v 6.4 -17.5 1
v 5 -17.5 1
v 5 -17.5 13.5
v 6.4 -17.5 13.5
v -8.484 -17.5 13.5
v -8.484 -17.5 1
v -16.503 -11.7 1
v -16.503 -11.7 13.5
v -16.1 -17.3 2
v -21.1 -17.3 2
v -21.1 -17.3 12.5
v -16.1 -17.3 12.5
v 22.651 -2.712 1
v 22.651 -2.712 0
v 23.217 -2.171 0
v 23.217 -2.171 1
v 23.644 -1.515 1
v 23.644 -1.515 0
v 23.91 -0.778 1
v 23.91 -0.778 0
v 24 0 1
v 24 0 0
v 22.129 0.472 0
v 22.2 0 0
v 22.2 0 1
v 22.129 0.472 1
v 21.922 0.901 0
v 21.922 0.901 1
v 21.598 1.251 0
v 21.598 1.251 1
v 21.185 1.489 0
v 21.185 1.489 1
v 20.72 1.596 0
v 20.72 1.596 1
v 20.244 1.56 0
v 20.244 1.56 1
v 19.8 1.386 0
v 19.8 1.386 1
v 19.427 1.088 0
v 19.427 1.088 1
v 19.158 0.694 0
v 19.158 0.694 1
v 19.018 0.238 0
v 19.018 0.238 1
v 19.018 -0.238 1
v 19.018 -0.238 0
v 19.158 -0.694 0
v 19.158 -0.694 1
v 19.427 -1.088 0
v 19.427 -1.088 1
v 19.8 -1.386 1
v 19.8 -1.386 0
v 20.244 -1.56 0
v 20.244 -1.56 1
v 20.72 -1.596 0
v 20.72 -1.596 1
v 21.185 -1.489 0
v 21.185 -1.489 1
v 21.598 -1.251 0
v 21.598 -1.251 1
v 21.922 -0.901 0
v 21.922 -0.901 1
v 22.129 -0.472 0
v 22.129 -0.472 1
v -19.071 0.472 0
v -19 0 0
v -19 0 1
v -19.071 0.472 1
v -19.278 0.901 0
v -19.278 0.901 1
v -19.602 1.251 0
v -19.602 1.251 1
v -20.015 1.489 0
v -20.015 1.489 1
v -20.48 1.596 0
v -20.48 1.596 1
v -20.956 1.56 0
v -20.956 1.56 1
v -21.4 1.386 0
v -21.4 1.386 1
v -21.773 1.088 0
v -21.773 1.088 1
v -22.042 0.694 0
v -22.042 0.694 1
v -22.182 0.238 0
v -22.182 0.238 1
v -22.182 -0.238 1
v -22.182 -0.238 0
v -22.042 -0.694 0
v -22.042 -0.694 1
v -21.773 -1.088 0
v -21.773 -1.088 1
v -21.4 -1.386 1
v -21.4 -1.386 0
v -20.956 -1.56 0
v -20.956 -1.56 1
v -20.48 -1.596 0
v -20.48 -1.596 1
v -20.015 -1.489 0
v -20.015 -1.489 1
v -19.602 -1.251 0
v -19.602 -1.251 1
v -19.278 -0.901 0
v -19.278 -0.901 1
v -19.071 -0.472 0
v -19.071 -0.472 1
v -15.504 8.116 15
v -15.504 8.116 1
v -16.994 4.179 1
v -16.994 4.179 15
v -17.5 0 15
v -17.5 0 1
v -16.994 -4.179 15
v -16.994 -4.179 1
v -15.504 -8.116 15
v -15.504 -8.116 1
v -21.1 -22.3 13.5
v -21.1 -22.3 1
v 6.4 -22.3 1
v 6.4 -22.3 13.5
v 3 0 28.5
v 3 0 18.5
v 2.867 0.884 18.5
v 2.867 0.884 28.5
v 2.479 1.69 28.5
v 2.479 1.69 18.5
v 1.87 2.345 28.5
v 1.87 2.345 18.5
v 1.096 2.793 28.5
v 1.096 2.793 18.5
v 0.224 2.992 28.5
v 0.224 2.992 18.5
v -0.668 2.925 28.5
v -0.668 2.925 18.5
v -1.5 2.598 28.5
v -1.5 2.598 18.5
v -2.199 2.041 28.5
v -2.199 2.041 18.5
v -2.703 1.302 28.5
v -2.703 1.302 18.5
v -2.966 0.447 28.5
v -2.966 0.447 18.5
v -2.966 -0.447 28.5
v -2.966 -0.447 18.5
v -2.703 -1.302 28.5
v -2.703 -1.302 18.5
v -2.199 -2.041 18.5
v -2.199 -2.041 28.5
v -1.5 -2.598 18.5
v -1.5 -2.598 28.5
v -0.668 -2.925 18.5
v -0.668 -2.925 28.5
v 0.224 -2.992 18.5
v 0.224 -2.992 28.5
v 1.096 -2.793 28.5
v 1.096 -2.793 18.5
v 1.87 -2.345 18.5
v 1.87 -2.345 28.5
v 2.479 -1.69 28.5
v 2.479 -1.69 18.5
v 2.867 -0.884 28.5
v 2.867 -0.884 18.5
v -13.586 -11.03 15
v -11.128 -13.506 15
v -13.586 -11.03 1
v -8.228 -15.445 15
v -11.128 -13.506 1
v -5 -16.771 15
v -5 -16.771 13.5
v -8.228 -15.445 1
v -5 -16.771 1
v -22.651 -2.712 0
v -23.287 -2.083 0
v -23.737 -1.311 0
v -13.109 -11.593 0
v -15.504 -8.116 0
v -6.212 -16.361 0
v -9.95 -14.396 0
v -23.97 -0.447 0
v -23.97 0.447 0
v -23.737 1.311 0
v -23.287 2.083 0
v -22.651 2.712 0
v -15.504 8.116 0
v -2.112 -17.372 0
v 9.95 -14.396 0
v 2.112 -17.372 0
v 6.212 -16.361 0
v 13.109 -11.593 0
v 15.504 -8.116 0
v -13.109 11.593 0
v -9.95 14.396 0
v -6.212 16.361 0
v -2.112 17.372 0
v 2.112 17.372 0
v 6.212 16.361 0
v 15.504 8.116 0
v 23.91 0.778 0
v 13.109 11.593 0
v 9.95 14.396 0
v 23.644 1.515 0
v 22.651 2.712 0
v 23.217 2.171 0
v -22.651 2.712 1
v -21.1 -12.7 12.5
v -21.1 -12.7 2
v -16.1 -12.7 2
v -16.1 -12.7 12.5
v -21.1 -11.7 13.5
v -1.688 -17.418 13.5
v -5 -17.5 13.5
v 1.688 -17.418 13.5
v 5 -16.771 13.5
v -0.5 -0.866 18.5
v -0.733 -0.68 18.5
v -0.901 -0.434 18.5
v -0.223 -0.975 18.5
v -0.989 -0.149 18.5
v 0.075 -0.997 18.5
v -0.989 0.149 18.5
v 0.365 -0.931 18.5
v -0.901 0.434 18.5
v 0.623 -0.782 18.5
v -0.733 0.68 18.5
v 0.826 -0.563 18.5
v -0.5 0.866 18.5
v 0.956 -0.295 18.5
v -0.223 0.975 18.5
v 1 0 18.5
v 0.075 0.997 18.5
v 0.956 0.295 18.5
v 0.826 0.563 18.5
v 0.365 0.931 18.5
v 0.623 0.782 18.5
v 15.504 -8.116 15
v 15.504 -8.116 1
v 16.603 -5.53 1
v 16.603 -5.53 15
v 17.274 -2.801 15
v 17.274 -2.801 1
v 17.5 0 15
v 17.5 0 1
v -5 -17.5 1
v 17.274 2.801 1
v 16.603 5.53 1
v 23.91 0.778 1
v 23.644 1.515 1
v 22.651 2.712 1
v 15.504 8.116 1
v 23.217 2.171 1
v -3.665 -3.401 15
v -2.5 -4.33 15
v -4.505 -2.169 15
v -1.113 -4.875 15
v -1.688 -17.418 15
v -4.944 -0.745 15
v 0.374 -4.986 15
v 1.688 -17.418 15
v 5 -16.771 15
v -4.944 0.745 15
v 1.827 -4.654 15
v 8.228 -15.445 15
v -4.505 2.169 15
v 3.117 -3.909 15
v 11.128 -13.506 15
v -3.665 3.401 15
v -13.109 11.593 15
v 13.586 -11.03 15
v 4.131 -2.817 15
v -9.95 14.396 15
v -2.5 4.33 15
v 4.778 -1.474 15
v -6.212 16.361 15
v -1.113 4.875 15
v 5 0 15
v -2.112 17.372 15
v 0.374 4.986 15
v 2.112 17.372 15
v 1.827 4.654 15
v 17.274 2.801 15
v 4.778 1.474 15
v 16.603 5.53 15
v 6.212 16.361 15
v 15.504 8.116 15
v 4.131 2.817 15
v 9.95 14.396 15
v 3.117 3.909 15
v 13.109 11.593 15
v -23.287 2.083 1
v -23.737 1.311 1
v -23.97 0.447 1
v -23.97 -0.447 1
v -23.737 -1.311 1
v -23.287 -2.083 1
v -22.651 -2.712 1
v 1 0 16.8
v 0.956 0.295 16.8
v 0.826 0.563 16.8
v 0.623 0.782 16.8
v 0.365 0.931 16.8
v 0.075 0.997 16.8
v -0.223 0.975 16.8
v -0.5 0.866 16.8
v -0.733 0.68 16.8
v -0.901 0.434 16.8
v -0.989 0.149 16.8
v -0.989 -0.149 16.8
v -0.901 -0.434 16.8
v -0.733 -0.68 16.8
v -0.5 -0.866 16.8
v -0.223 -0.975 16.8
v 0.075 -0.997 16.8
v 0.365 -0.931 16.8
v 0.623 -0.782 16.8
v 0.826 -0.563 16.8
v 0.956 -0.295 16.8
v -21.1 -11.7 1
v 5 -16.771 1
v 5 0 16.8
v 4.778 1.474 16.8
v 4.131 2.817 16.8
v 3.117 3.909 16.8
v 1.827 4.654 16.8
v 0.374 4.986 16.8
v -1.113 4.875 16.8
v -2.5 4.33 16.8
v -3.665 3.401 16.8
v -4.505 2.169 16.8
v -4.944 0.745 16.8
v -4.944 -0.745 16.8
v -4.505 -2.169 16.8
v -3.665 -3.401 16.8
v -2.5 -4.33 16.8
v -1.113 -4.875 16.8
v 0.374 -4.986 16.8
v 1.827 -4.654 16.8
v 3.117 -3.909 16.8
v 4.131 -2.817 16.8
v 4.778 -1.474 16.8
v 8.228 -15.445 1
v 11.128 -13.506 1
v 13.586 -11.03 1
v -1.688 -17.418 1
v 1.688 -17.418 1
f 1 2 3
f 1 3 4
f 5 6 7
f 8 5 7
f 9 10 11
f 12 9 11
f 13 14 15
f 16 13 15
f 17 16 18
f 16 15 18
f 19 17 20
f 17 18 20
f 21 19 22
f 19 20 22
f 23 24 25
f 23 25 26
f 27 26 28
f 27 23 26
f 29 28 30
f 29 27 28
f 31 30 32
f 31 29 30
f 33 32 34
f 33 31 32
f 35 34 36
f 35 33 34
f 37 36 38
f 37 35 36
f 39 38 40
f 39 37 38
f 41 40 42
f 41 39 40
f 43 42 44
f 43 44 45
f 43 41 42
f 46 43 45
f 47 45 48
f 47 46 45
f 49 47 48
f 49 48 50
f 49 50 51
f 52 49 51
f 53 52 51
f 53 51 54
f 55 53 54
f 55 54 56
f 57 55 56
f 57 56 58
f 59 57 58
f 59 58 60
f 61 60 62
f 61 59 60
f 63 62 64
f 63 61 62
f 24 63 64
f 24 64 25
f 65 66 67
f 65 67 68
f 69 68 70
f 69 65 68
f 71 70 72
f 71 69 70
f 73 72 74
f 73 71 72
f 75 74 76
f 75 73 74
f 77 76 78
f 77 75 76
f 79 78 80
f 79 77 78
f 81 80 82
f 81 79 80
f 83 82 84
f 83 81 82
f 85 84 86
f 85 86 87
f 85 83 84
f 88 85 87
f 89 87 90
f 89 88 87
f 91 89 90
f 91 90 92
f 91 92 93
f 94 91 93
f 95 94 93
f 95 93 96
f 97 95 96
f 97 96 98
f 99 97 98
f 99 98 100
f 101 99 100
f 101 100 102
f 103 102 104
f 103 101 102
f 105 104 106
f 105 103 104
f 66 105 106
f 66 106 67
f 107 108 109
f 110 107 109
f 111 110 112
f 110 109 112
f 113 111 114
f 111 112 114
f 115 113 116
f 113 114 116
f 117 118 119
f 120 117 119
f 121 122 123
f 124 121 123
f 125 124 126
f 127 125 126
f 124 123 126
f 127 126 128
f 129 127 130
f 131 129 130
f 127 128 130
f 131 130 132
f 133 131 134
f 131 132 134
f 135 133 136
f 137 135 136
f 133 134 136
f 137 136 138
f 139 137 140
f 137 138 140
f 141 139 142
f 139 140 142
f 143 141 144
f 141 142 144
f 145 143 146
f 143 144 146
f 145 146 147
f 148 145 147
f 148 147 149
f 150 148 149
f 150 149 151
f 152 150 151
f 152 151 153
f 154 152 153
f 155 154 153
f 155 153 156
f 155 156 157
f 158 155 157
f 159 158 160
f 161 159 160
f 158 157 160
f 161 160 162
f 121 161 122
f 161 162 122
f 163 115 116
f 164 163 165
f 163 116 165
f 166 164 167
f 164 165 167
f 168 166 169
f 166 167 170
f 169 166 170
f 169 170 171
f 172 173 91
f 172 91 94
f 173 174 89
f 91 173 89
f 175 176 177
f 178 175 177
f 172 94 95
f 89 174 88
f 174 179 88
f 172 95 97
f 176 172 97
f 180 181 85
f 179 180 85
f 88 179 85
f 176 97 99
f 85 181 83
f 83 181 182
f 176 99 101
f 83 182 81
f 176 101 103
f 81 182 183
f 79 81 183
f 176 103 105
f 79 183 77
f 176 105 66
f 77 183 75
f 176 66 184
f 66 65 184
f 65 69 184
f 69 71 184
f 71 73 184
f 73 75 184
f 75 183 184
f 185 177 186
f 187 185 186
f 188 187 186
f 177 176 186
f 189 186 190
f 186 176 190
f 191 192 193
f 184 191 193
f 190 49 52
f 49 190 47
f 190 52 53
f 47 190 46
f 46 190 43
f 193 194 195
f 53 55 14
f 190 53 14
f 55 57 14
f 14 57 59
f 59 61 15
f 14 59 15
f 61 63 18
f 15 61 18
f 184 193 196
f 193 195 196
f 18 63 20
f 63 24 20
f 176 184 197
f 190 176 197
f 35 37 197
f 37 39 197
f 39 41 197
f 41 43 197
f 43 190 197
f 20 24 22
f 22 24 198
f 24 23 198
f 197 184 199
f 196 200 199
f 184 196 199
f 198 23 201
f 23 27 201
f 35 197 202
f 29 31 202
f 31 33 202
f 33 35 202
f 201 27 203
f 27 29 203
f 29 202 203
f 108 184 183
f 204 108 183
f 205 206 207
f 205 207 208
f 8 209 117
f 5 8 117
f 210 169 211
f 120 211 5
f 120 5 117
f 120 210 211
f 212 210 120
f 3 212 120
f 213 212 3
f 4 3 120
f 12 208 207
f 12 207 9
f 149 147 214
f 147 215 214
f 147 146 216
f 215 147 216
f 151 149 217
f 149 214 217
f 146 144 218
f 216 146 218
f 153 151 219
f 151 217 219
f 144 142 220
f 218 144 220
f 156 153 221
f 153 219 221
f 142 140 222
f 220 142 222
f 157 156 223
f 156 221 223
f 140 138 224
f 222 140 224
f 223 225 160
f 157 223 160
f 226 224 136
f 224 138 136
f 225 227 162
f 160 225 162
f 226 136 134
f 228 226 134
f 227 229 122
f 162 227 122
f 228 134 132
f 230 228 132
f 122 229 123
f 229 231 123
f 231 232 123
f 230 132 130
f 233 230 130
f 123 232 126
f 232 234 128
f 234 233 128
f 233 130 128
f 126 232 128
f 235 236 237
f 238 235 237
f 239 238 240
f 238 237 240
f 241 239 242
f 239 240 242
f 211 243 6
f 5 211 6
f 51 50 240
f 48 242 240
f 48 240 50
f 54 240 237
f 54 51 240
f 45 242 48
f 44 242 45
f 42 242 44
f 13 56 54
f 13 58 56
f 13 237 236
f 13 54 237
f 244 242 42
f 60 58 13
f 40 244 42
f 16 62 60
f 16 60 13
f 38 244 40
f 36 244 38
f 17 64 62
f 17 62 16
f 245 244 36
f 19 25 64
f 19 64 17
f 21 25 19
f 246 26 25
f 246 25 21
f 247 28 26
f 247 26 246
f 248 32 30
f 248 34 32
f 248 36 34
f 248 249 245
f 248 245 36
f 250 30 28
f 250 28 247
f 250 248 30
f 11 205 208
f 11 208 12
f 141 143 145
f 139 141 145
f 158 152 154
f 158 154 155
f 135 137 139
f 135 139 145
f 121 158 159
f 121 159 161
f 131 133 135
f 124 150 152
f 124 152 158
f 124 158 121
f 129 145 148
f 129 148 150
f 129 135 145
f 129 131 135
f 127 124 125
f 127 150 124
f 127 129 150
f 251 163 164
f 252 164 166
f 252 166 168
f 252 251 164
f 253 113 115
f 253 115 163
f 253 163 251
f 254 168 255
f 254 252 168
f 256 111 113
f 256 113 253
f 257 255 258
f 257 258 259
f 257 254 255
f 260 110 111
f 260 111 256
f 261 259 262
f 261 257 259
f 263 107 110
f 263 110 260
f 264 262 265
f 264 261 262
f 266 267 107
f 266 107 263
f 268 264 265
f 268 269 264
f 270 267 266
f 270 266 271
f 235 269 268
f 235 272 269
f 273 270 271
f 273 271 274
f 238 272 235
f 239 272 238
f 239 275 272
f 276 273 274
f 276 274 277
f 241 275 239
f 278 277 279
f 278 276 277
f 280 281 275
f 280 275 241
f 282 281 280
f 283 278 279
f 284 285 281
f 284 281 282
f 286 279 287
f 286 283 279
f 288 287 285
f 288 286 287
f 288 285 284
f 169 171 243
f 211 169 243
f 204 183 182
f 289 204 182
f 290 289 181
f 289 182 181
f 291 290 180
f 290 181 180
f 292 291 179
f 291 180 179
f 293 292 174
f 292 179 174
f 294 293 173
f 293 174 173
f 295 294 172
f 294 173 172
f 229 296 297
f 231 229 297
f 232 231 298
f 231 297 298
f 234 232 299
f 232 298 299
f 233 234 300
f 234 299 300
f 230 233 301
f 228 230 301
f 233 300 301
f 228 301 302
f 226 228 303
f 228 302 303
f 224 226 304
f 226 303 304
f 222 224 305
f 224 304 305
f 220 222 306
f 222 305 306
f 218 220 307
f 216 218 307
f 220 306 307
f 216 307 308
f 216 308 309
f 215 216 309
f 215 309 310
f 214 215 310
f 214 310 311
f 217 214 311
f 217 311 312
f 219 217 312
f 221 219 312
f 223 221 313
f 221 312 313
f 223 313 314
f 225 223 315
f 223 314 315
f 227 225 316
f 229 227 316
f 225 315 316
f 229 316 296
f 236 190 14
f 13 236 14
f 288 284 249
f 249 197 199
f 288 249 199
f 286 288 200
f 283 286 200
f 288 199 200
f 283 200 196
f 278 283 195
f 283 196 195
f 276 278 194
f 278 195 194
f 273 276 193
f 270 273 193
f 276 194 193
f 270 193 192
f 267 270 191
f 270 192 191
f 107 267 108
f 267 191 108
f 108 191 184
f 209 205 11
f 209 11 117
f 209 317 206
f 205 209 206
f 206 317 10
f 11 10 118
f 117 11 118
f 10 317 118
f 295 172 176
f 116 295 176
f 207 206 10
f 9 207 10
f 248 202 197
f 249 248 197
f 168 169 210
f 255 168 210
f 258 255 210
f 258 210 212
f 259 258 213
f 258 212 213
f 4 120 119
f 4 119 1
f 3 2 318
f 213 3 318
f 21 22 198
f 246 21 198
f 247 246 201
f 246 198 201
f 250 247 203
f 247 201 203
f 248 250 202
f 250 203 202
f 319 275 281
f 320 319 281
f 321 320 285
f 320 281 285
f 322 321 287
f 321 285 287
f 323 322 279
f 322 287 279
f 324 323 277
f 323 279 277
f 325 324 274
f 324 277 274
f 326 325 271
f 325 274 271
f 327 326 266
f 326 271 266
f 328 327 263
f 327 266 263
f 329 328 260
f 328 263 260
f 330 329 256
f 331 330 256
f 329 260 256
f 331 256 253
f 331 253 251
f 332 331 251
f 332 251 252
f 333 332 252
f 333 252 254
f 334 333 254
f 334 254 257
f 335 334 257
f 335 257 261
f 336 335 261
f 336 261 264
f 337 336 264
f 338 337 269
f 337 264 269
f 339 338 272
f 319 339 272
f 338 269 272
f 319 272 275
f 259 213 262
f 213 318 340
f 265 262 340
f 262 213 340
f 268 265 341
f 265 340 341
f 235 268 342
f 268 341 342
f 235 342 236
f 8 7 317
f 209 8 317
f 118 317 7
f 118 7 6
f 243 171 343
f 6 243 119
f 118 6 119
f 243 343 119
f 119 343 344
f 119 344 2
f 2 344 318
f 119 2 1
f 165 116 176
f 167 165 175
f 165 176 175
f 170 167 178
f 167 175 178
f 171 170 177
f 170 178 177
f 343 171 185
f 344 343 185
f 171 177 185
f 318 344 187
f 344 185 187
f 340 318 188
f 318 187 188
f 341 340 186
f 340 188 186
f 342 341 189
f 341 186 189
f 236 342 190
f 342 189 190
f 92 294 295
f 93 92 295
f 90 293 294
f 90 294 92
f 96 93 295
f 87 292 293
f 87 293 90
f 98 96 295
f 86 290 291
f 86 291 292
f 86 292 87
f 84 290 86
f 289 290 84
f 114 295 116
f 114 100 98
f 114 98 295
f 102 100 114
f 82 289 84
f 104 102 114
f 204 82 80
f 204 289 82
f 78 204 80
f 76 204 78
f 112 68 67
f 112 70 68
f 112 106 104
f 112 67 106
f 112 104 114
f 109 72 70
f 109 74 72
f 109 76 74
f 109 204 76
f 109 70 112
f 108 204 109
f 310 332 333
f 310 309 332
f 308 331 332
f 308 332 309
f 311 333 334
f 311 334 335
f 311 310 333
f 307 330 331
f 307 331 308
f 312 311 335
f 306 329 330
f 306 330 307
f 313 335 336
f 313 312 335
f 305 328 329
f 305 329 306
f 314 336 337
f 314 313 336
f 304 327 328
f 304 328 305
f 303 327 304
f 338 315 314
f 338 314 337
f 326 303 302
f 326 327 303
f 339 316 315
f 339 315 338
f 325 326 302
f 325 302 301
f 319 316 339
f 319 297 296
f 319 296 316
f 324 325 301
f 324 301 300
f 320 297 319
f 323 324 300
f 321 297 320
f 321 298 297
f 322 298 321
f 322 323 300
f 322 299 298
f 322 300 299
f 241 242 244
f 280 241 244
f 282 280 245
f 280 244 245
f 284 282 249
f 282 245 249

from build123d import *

# Parameters (mm, degrees)
F0_R      = 1.6
F1_DEPTH  = 1
F3_DEPTH  = 14
F2_W      = 1.4
F2_H      = 4.8
F4_DEPTH  = 12.5
F5_R      = 5
F6_DEPTH  = 1.8
F7_R      = 1
F8_DEPTH  = 1.7
F9_R      = 3
F10_DEPTH = 10
F11_W     = 4.6
F11_H     = 10.5
F12_DEPTH = 5


with BuildPart() as f1:
    # F0 (on Top) → F1 (new body)
    with BuildSketch(Plane.XY):
        with BuildLine():
            Line((15.5043796111, -8.1156769819), (15.5043796111, 8.1156769819))
            ThreePointArc((15.5043796111, 8.1156769819), (0, 17.5), (-15.5043796111, 8.1156769819))
            Line((-15.5043796111, 8.1156769819), (-15.5043796111, -8.1156769819))
            ThreePointArc((-15.5043796111, -8.1156769819), (0, -17.5), (15.5043796111, -8.1156769819))
        make_face()
        with BuildLine():
            Line((22.650669435, 2.7119651303), (15.5043796111, 8.1156769819))
            ThreePointArc((15.5043796111, 8.1156769819), (16.8286129371, 4.8008110372), (17.4526699029, 1.2862010962))
            ThreePointArc((17.4526699029, 1.2862010962), (19.700629708, 3.2788920504), (22.650669435, 2.7119651303))
        make_face()
        with BuildLine():
            ThreePointArc((17.4526699029, 1.2862010962), (16.8286129371, 4.8008110372), (15.5043796111, 8.1156769819))
            Line((15.5043796111, 8.1156769819), (15.5043796111, -8.1156769819))
            ThreePointArc((15.5043796111, -8.1156769819), (16.8286129371, -4.8008110372), (17.4526699029, -1.2862010962))
            ThreePointArc((17.4526699029, -1.2862010962), (17.2, 0), (17.4526699029, 1.2862010962))
        make_face()
        with BuildLine():
            Line((-15.5043796111, -8.1156769819), (-15.5043796111, 8.1156769819))
            ThreePointArc((-15.5043796111, 8.1156769819), (-16.8286129371, 4.8008110372), (-17.4526699029, 1.2862010962))
            ThreePointArc((-17.4526699029, 1.2862010962), (-17.2637654212, 0.655392123), (-17.2, 0))
            ThreePointArc((-17.2, 0), (-17.2637654212, -0.655392123), (-17.4526699029, -1.2862010962))
            ThreePointArc((-17.4526699029, -1.2862010962), (-16.8286129371, -4.8008110372), (-15.5043796111, -8.1156769819))
        make_face()
        with BuildLine():
            ThreePointArc((-17.4526699029, 1.2862010962), (-16.8286129371, 4.8008110372), (-15.5043796111, 8.1156769819))
            Line((-15.5043796111, 8.1156769819), (-22.650669435, 2.7119651303))
            ThreePointArc((-22.650669435, 2.7119651303), (-19.700629708, 3.2788920504), (-17.4526699029, 1.2862010962))
        make_face()
        with BuildLine():
            ThreePointArc((22.650669435, 2.7119651303), (19.700629708, 3.2788920504), (17.4526699029, 1.2862010962))
            ThreePointArc((17.4526699029, 1.2862010962), (17.4881634728, 0.6435358184), (17.5, 0))
            ThreePointArc((17.5, 0), (17.4881634728, -0.6435358184), (17.4526699029, -1.2862010962))
            ThreePointArc((17.4526699029, -1.2862010962), (19.700629708, -3.2788920504), (22.650669435, -2.7119651303))
            Line((22.650669435, -2.7119651303), (22.650669435, 2.7119651303))
        make_face()
        with Locations((20.6, 0)):
            Circle(F0_R, mode=Mode.SUBTRACT)
        with BuildLine():
            ThreePointArc((17.4526699029, -1.2862010962), (16.8286129371, -4.8008110372), (15.5043796111, -8.1156769819))
            Line((15.5043796111, -8.1156769819), (22.650669435, -2.7119651303))
            ThreePointArc((22.650669435, -2.7119651303), (19.700629708, -3.2788920504), (17.4526699029, -1.2862010962))
        make_face()
        with BuildLine():
            ThreePointArc((24, 0), (23.6440331863, 1.5145500851), (22.650669435, 2.7119651303))
            Line((22.650669435, 2.7119651303), (22.650669435, -2.7119651303))
            ThreePointArc((22.650669435, -2.7119651303), (23.6440331863, -1.5145500851), (24, 0))
        make_face()
        with BuildLine():
            ThreePointArc((-17.4526699029, -1.2862010962), (-17.5, 0), (-17.4526699029, 1.2862010962))
            ThreePointArc((-17.4526699029, 1.2862010962), (-19.700629708, 3.2788920504), (-22.650669435, 2.7119651303))
            Line((-22.650669435, 2.7119651303), (-22.650669435, -2.7119651303))
            ThreePointArc((-22.650669435, -2.7119651303), (-19.700629708, -3.2788920504), (-17.4526699029, -1.2862010962))
        make_face()
        with Locations((-20.6, 0)):
            Circle(F0_R, mode=Mode.SUBTRACT)
        with BuildLine():
            Line((-22.650669435, -2.7119651303), (-22.650669435, 2.7119651303))
            ThreePointArc((-22.650669435, 2.7119651303), (-24, 0), (-22.650669435, -2.7119651303))
        make_face()
        with BuildLine():
            Line((-22.650669435, -2.7119651303), (-15.5043796111, -8.1156769819))
            ThreePointArc((-15.5043796111, -8.1156769819), (-16.8286129371, -4.8008110372), (-17.4526699029, -1.2862010962))
            ThreePointArc((-17.4526699029, -1.2862010962), (-19.700629708, -3.2788920504), (-22.650669435, -2.7119651303))
        make_face()
        with BuildLine():
            ThreePointArc((-17.2, 0), (-17.2637654212, 0.655392123), (-17.4526699029, 1.2862010962))
            ThreePointArc((-17.4526699029, 1.2862010962), (-17.5, 0), (-17.4526699029, -1.2862010962))
            ThreePointArc((-17.4526699029, -1.2862010962), (-17.2637654212, -0.655392123), (-17.2, 0))
        make_face()
        with BuildLine():
            ThreePointArc((17.5, 0), (17.4881634728, 0.6435358184), (17.4526699029, 1.2862010962))
            ThreePointArc((17.4526699029, 1.2862010962), (17.2, 0), (17.4526699029, -1.2862010962))
            ThreePointArc((17.4526699029, -1.2862010962), (17.4881634728, -0.6435358184), (17.5, 0))
        make_face()
    extrude(amount=F1_DEPTH)

    # F2 (on face) → F3 (join)
    with BuildSketch(Plane.XY.offset(1)):
        with BuildLine():
            ThreePointArc((15.5043796111, -8.1156769819), (16.9937730242, -4.1787173155), (17.5, 0))
            ThreePointArc((17.5, 0), (16.9937730242, 4.1787173155), (15.5043796111, 8.1156769819))
            ThreePointArc((15.5043796111, 8.1156769819), (0, 17.5), (-15.5043796111, 8.1156769819))
            ThreePointArc((-15.5043796111, 8.1156769819), (-17.5, 0), (-15.5043796111, -8.1156769819))
            ThreePointArc((-15.5043796111, -8.1156769819), (-11.1280694067, -13.5061493875), (-5, -16.7705098312))
            Line((-5, -16.7705098312), (-5, 0))
            Line((-5, 0), (5, 0))
            Line((5, 0), (5, -16.7705098312))
            ThreePointArc((5, -16.7705098312), (11.1280694067, -13.5061493875), (15.5043796111, -8.1156769819))
        make_face()
        with BuildLine():
            ThreePointArc((-5.71e-08, -17.5), (2.5264676594, -17.3166671495), (5, -16.7705098312))
            Line((5, -16.7705098312), (5, 0))
            Line((5, 0), (-5, 0))
            Line((-5, 0), (-5, -16.7705098312))
            ThreePointArc((-5, -16.7705098312), (-2.5264677159, -17.3166671412), (-5.71e-08, -17.5))
        make_face()
    extrude(amount=F3_DEPTH)

    # F2 (on face) → F4 (join)
    with BuildSketch(Plane.XY.offset(1)):
        with BuildLine():
            ThreePointArc((5, -16.7705098312), (14.0312152004, -10.4582503317), (17.5, 0))
            ThreePointArc((17.5, 0), (-10.4582503317, 14.0312152004), (-5, -16.7705098312))
            Line((-5, -16.7705098312), (-5, 0))
            Line((-5, 0), (5, 0))
            Line((5, 0), (5, -16.7705098312))
        make_face()
        with BuildLine():
            Line((-5, 0), (-5, -16.7705098312))
            ThreePointArc((-5, -16.7705098312), (-2.5264677035, -17.316667143), (-3.21e-08, -17.5))
            ThreePointArc((-3.21e-08, -17.5), (2.5264676717, -17.3166671477), (5, -16.7705098312))
            Line((5, -16.7705098312), (5, 0))
            Line((5, 0), (-5, 0))
        make_face()
        with BuildLine():
            ThreePointArc((-3.21e-08, -17.5), (-2.5264677035, -17.316667143), (-5, -16.7705098312))
            Line((-5, -16.7705098312), (-5, -17.5))
            Line((-5, -17.5), (-3.21e-08, -17.5))
        make_face()
        with BuildLine():
            Line((5, -17.5), (5, -16.7705098312))
            ThreePointArc((5, -16.7705098312), (2.5264676717, -17.3166671477), (-3.21e-08, -17.5))
            Line((-3.21e-08, -17.5), (5, -17.5))
        make_face()
        Polygon((5, -17.5), (-3.21e-08, -17.5), (-5, -17.5), (-5, -22.3), (5, -22.3), align=None)
        Polygon((-5, -22.3), (-5, -17.5), (-8.4841037169, -17.5), (-21.1, -17.5), (-21.1, -22.3), align=None)
        with Locations((5.7, -19.9)):
            Rectangle(F2_W, F2_H)
        Polygon((-21.1, -17.5), (-8.4841037169, -17.5), (-16.5028385818, -11.7), (-21.1, -11.7), align=None)
    extrude(amount=F4_DEPTH)

    # F5 (on face) → F6 (join)
    with BuildSketch(Plane.XY.offset(15)):
        Circle(F5_R)
    extrude(amount=F6_DEPTH)

    # F7 (on face) → F8 (join)
    with BuildSketch(Plane.XY.offset(16.8)):
        Circle(F7_R)
    extrude(amount=F8_DEPTH)

    # F9 (on face) → F10 (join)
    with BuildSketch(Plane.XY.offset(18.5)):
        Circle(F9_R)
    extrude(amount=F10_DEPTH)

    # F11 (on face) → F12 (cut)
    with BuildSketch(Plane(origin=(-21.1, 0, 0), x_dir=(0, -1, 0), z_dir=(-1, 0, 0))):
        with Locations((15, 7.25)):
            Rectangle(F11_W, F11_H)
    extrude(amount=-F12_DEPTH, mode=Mode.SUBTRACT)


solid = f1.part
